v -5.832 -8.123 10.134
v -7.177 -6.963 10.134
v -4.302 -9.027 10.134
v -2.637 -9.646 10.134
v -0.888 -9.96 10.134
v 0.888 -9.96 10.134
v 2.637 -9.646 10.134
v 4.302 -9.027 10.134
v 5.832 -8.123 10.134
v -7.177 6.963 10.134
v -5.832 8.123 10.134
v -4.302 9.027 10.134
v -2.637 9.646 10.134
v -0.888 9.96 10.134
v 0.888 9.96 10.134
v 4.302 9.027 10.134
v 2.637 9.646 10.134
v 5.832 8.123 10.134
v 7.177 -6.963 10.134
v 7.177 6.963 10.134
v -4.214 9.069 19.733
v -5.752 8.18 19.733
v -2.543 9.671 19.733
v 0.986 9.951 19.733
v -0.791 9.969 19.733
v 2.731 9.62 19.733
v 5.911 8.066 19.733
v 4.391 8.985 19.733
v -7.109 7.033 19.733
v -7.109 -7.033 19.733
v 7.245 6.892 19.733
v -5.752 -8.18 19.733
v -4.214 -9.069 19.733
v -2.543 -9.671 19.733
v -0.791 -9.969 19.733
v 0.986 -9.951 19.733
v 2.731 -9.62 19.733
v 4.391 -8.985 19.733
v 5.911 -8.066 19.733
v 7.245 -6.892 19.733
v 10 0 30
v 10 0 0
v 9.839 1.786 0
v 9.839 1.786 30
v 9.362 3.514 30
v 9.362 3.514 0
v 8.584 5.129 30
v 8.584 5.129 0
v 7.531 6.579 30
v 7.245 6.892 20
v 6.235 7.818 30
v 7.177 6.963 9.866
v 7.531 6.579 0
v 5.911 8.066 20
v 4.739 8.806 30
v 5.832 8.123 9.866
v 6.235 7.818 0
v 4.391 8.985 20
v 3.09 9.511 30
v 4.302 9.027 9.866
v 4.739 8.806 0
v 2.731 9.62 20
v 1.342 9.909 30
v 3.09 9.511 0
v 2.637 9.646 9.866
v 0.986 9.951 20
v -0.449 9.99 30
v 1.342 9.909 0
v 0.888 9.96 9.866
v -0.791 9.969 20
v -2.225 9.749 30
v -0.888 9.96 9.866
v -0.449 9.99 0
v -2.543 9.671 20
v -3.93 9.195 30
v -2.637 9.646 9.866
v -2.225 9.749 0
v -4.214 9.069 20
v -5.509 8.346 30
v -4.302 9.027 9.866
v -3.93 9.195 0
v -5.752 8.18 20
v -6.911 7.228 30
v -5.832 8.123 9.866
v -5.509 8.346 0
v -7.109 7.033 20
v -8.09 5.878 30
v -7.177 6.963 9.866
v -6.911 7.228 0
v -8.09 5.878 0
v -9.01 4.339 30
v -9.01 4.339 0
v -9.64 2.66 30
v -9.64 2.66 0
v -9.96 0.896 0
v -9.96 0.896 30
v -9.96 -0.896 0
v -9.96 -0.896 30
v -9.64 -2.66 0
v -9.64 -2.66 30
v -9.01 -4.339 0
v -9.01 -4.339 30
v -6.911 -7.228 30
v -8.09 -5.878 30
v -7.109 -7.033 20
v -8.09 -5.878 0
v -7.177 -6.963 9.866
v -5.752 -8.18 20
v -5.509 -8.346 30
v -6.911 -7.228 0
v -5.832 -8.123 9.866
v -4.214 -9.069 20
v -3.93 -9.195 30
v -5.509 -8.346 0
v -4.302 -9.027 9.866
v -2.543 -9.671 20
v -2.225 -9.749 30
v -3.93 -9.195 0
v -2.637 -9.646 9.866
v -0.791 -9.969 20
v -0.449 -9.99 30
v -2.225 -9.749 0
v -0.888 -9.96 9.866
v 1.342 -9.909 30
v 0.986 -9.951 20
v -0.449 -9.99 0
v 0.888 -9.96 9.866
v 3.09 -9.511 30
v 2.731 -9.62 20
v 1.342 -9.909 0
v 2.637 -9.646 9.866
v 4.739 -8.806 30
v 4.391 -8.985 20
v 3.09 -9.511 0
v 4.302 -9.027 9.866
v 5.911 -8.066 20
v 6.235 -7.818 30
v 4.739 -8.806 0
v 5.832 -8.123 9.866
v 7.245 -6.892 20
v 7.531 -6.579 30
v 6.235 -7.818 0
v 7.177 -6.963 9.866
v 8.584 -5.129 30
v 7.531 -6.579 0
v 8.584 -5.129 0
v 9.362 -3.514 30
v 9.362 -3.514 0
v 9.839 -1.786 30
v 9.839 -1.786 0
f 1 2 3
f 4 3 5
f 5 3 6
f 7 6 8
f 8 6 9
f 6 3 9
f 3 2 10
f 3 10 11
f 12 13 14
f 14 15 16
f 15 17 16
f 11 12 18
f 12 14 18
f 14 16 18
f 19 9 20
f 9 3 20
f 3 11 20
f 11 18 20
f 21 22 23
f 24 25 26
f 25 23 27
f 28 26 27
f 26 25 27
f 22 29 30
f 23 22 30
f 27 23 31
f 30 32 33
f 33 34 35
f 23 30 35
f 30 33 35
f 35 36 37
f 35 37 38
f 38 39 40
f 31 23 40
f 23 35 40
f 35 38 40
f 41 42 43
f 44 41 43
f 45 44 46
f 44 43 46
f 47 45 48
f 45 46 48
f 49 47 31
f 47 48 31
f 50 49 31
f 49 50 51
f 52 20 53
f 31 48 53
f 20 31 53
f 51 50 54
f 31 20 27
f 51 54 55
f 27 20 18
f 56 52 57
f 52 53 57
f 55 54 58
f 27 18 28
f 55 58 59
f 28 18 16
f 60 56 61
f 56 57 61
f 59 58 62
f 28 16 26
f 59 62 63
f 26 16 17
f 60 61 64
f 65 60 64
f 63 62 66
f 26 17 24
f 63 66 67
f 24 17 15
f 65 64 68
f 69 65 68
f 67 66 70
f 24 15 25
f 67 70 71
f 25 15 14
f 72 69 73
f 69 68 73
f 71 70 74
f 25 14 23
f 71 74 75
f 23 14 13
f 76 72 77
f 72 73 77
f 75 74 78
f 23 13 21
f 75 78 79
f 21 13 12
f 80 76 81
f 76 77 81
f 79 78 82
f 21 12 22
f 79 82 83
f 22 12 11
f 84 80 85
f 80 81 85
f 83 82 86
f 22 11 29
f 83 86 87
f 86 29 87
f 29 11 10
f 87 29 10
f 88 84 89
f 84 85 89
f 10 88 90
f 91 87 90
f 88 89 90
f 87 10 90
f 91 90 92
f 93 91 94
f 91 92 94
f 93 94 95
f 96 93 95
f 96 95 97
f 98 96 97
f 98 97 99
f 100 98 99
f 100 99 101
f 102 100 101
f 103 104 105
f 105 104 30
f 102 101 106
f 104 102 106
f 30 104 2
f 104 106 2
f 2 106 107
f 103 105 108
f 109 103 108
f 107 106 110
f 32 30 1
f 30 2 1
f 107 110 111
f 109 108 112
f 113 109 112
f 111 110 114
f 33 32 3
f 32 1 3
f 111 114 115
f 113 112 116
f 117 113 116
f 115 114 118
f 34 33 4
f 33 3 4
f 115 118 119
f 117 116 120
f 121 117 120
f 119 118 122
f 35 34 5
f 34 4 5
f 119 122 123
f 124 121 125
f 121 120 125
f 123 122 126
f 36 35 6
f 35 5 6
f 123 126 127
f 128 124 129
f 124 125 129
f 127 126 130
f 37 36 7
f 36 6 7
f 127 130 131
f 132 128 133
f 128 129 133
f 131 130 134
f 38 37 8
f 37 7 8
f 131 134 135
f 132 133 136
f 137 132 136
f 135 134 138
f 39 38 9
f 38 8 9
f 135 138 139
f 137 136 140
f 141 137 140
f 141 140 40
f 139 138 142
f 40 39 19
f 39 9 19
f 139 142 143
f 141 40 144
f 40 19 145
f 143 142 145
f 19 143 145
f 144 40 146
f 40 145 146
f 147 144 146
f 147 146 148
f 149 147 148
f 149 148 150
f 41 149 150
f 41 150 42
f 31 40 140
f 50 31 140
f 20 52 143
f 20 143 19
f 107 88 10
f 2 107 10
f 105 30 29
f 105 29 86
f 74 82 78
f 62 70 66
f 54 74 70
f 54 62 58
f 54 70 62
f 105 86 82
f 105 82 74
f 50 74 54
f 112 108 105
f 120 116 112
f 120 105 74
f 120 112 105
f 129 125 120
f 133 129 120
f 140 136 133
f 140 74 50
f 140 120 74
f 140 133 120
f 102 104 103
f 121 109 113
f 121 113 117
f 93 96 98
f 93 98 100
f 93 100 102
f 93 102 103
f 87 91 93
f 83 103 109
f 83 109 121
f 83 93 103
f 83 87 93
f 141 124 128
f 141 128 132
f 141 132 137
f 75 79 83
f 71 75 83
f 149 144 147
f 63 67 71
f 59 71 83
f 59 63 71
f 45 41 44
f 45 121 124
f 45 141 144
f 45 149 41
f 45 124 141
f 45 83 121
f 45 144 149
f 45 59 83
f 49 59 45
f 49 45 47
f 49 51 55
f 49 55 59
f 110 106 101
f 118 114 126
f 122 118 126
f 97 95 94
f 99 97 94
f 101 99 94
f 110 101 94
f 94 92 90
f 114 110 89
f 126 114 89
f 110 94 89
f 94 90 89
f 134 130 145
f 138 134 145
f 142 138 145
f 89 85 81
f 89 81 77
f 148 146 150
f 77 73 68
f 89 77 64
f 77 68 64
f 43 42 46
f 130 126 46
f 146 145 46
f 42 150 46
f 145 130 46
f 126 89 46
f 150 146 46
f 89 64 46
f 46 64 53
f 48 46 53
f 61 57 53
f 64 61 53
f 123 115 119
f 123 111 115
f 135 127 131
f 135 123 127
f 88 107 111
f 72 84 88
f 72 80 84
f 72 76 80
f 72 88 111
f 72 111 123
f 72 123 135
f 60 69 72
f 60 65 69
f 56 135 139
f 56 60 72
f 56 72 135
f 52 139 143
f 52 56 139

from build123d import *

# Parameters (mm, degrees)
F0_R     = 10
F1_DEPTH = 30
F2_W     = 14.354546
F2_H     = 0.267448
F3_DEPTH = 12.7


with BuildPart() as f1:
    # F0 (on Top) → F1 (new body)
    with BuildSketch(Plane.XY):
        Circle(F0_R)
    extrude(amount=F1_DEPTH)

    # F2 (on Front) → F3 (cut, symmetric)
    with BuildSketch(Plane.XZ):
        with Locations((0, 10)):
            Rectangle(F2_W, F2_H)
        with Locations((0.068115, 19.866276)):
            Rectangle(F2_W, F2_H)
    extrude(amount=F3_DEPTH, both=True, mode=Mode.SUBTRACT)


solid = f1.part
